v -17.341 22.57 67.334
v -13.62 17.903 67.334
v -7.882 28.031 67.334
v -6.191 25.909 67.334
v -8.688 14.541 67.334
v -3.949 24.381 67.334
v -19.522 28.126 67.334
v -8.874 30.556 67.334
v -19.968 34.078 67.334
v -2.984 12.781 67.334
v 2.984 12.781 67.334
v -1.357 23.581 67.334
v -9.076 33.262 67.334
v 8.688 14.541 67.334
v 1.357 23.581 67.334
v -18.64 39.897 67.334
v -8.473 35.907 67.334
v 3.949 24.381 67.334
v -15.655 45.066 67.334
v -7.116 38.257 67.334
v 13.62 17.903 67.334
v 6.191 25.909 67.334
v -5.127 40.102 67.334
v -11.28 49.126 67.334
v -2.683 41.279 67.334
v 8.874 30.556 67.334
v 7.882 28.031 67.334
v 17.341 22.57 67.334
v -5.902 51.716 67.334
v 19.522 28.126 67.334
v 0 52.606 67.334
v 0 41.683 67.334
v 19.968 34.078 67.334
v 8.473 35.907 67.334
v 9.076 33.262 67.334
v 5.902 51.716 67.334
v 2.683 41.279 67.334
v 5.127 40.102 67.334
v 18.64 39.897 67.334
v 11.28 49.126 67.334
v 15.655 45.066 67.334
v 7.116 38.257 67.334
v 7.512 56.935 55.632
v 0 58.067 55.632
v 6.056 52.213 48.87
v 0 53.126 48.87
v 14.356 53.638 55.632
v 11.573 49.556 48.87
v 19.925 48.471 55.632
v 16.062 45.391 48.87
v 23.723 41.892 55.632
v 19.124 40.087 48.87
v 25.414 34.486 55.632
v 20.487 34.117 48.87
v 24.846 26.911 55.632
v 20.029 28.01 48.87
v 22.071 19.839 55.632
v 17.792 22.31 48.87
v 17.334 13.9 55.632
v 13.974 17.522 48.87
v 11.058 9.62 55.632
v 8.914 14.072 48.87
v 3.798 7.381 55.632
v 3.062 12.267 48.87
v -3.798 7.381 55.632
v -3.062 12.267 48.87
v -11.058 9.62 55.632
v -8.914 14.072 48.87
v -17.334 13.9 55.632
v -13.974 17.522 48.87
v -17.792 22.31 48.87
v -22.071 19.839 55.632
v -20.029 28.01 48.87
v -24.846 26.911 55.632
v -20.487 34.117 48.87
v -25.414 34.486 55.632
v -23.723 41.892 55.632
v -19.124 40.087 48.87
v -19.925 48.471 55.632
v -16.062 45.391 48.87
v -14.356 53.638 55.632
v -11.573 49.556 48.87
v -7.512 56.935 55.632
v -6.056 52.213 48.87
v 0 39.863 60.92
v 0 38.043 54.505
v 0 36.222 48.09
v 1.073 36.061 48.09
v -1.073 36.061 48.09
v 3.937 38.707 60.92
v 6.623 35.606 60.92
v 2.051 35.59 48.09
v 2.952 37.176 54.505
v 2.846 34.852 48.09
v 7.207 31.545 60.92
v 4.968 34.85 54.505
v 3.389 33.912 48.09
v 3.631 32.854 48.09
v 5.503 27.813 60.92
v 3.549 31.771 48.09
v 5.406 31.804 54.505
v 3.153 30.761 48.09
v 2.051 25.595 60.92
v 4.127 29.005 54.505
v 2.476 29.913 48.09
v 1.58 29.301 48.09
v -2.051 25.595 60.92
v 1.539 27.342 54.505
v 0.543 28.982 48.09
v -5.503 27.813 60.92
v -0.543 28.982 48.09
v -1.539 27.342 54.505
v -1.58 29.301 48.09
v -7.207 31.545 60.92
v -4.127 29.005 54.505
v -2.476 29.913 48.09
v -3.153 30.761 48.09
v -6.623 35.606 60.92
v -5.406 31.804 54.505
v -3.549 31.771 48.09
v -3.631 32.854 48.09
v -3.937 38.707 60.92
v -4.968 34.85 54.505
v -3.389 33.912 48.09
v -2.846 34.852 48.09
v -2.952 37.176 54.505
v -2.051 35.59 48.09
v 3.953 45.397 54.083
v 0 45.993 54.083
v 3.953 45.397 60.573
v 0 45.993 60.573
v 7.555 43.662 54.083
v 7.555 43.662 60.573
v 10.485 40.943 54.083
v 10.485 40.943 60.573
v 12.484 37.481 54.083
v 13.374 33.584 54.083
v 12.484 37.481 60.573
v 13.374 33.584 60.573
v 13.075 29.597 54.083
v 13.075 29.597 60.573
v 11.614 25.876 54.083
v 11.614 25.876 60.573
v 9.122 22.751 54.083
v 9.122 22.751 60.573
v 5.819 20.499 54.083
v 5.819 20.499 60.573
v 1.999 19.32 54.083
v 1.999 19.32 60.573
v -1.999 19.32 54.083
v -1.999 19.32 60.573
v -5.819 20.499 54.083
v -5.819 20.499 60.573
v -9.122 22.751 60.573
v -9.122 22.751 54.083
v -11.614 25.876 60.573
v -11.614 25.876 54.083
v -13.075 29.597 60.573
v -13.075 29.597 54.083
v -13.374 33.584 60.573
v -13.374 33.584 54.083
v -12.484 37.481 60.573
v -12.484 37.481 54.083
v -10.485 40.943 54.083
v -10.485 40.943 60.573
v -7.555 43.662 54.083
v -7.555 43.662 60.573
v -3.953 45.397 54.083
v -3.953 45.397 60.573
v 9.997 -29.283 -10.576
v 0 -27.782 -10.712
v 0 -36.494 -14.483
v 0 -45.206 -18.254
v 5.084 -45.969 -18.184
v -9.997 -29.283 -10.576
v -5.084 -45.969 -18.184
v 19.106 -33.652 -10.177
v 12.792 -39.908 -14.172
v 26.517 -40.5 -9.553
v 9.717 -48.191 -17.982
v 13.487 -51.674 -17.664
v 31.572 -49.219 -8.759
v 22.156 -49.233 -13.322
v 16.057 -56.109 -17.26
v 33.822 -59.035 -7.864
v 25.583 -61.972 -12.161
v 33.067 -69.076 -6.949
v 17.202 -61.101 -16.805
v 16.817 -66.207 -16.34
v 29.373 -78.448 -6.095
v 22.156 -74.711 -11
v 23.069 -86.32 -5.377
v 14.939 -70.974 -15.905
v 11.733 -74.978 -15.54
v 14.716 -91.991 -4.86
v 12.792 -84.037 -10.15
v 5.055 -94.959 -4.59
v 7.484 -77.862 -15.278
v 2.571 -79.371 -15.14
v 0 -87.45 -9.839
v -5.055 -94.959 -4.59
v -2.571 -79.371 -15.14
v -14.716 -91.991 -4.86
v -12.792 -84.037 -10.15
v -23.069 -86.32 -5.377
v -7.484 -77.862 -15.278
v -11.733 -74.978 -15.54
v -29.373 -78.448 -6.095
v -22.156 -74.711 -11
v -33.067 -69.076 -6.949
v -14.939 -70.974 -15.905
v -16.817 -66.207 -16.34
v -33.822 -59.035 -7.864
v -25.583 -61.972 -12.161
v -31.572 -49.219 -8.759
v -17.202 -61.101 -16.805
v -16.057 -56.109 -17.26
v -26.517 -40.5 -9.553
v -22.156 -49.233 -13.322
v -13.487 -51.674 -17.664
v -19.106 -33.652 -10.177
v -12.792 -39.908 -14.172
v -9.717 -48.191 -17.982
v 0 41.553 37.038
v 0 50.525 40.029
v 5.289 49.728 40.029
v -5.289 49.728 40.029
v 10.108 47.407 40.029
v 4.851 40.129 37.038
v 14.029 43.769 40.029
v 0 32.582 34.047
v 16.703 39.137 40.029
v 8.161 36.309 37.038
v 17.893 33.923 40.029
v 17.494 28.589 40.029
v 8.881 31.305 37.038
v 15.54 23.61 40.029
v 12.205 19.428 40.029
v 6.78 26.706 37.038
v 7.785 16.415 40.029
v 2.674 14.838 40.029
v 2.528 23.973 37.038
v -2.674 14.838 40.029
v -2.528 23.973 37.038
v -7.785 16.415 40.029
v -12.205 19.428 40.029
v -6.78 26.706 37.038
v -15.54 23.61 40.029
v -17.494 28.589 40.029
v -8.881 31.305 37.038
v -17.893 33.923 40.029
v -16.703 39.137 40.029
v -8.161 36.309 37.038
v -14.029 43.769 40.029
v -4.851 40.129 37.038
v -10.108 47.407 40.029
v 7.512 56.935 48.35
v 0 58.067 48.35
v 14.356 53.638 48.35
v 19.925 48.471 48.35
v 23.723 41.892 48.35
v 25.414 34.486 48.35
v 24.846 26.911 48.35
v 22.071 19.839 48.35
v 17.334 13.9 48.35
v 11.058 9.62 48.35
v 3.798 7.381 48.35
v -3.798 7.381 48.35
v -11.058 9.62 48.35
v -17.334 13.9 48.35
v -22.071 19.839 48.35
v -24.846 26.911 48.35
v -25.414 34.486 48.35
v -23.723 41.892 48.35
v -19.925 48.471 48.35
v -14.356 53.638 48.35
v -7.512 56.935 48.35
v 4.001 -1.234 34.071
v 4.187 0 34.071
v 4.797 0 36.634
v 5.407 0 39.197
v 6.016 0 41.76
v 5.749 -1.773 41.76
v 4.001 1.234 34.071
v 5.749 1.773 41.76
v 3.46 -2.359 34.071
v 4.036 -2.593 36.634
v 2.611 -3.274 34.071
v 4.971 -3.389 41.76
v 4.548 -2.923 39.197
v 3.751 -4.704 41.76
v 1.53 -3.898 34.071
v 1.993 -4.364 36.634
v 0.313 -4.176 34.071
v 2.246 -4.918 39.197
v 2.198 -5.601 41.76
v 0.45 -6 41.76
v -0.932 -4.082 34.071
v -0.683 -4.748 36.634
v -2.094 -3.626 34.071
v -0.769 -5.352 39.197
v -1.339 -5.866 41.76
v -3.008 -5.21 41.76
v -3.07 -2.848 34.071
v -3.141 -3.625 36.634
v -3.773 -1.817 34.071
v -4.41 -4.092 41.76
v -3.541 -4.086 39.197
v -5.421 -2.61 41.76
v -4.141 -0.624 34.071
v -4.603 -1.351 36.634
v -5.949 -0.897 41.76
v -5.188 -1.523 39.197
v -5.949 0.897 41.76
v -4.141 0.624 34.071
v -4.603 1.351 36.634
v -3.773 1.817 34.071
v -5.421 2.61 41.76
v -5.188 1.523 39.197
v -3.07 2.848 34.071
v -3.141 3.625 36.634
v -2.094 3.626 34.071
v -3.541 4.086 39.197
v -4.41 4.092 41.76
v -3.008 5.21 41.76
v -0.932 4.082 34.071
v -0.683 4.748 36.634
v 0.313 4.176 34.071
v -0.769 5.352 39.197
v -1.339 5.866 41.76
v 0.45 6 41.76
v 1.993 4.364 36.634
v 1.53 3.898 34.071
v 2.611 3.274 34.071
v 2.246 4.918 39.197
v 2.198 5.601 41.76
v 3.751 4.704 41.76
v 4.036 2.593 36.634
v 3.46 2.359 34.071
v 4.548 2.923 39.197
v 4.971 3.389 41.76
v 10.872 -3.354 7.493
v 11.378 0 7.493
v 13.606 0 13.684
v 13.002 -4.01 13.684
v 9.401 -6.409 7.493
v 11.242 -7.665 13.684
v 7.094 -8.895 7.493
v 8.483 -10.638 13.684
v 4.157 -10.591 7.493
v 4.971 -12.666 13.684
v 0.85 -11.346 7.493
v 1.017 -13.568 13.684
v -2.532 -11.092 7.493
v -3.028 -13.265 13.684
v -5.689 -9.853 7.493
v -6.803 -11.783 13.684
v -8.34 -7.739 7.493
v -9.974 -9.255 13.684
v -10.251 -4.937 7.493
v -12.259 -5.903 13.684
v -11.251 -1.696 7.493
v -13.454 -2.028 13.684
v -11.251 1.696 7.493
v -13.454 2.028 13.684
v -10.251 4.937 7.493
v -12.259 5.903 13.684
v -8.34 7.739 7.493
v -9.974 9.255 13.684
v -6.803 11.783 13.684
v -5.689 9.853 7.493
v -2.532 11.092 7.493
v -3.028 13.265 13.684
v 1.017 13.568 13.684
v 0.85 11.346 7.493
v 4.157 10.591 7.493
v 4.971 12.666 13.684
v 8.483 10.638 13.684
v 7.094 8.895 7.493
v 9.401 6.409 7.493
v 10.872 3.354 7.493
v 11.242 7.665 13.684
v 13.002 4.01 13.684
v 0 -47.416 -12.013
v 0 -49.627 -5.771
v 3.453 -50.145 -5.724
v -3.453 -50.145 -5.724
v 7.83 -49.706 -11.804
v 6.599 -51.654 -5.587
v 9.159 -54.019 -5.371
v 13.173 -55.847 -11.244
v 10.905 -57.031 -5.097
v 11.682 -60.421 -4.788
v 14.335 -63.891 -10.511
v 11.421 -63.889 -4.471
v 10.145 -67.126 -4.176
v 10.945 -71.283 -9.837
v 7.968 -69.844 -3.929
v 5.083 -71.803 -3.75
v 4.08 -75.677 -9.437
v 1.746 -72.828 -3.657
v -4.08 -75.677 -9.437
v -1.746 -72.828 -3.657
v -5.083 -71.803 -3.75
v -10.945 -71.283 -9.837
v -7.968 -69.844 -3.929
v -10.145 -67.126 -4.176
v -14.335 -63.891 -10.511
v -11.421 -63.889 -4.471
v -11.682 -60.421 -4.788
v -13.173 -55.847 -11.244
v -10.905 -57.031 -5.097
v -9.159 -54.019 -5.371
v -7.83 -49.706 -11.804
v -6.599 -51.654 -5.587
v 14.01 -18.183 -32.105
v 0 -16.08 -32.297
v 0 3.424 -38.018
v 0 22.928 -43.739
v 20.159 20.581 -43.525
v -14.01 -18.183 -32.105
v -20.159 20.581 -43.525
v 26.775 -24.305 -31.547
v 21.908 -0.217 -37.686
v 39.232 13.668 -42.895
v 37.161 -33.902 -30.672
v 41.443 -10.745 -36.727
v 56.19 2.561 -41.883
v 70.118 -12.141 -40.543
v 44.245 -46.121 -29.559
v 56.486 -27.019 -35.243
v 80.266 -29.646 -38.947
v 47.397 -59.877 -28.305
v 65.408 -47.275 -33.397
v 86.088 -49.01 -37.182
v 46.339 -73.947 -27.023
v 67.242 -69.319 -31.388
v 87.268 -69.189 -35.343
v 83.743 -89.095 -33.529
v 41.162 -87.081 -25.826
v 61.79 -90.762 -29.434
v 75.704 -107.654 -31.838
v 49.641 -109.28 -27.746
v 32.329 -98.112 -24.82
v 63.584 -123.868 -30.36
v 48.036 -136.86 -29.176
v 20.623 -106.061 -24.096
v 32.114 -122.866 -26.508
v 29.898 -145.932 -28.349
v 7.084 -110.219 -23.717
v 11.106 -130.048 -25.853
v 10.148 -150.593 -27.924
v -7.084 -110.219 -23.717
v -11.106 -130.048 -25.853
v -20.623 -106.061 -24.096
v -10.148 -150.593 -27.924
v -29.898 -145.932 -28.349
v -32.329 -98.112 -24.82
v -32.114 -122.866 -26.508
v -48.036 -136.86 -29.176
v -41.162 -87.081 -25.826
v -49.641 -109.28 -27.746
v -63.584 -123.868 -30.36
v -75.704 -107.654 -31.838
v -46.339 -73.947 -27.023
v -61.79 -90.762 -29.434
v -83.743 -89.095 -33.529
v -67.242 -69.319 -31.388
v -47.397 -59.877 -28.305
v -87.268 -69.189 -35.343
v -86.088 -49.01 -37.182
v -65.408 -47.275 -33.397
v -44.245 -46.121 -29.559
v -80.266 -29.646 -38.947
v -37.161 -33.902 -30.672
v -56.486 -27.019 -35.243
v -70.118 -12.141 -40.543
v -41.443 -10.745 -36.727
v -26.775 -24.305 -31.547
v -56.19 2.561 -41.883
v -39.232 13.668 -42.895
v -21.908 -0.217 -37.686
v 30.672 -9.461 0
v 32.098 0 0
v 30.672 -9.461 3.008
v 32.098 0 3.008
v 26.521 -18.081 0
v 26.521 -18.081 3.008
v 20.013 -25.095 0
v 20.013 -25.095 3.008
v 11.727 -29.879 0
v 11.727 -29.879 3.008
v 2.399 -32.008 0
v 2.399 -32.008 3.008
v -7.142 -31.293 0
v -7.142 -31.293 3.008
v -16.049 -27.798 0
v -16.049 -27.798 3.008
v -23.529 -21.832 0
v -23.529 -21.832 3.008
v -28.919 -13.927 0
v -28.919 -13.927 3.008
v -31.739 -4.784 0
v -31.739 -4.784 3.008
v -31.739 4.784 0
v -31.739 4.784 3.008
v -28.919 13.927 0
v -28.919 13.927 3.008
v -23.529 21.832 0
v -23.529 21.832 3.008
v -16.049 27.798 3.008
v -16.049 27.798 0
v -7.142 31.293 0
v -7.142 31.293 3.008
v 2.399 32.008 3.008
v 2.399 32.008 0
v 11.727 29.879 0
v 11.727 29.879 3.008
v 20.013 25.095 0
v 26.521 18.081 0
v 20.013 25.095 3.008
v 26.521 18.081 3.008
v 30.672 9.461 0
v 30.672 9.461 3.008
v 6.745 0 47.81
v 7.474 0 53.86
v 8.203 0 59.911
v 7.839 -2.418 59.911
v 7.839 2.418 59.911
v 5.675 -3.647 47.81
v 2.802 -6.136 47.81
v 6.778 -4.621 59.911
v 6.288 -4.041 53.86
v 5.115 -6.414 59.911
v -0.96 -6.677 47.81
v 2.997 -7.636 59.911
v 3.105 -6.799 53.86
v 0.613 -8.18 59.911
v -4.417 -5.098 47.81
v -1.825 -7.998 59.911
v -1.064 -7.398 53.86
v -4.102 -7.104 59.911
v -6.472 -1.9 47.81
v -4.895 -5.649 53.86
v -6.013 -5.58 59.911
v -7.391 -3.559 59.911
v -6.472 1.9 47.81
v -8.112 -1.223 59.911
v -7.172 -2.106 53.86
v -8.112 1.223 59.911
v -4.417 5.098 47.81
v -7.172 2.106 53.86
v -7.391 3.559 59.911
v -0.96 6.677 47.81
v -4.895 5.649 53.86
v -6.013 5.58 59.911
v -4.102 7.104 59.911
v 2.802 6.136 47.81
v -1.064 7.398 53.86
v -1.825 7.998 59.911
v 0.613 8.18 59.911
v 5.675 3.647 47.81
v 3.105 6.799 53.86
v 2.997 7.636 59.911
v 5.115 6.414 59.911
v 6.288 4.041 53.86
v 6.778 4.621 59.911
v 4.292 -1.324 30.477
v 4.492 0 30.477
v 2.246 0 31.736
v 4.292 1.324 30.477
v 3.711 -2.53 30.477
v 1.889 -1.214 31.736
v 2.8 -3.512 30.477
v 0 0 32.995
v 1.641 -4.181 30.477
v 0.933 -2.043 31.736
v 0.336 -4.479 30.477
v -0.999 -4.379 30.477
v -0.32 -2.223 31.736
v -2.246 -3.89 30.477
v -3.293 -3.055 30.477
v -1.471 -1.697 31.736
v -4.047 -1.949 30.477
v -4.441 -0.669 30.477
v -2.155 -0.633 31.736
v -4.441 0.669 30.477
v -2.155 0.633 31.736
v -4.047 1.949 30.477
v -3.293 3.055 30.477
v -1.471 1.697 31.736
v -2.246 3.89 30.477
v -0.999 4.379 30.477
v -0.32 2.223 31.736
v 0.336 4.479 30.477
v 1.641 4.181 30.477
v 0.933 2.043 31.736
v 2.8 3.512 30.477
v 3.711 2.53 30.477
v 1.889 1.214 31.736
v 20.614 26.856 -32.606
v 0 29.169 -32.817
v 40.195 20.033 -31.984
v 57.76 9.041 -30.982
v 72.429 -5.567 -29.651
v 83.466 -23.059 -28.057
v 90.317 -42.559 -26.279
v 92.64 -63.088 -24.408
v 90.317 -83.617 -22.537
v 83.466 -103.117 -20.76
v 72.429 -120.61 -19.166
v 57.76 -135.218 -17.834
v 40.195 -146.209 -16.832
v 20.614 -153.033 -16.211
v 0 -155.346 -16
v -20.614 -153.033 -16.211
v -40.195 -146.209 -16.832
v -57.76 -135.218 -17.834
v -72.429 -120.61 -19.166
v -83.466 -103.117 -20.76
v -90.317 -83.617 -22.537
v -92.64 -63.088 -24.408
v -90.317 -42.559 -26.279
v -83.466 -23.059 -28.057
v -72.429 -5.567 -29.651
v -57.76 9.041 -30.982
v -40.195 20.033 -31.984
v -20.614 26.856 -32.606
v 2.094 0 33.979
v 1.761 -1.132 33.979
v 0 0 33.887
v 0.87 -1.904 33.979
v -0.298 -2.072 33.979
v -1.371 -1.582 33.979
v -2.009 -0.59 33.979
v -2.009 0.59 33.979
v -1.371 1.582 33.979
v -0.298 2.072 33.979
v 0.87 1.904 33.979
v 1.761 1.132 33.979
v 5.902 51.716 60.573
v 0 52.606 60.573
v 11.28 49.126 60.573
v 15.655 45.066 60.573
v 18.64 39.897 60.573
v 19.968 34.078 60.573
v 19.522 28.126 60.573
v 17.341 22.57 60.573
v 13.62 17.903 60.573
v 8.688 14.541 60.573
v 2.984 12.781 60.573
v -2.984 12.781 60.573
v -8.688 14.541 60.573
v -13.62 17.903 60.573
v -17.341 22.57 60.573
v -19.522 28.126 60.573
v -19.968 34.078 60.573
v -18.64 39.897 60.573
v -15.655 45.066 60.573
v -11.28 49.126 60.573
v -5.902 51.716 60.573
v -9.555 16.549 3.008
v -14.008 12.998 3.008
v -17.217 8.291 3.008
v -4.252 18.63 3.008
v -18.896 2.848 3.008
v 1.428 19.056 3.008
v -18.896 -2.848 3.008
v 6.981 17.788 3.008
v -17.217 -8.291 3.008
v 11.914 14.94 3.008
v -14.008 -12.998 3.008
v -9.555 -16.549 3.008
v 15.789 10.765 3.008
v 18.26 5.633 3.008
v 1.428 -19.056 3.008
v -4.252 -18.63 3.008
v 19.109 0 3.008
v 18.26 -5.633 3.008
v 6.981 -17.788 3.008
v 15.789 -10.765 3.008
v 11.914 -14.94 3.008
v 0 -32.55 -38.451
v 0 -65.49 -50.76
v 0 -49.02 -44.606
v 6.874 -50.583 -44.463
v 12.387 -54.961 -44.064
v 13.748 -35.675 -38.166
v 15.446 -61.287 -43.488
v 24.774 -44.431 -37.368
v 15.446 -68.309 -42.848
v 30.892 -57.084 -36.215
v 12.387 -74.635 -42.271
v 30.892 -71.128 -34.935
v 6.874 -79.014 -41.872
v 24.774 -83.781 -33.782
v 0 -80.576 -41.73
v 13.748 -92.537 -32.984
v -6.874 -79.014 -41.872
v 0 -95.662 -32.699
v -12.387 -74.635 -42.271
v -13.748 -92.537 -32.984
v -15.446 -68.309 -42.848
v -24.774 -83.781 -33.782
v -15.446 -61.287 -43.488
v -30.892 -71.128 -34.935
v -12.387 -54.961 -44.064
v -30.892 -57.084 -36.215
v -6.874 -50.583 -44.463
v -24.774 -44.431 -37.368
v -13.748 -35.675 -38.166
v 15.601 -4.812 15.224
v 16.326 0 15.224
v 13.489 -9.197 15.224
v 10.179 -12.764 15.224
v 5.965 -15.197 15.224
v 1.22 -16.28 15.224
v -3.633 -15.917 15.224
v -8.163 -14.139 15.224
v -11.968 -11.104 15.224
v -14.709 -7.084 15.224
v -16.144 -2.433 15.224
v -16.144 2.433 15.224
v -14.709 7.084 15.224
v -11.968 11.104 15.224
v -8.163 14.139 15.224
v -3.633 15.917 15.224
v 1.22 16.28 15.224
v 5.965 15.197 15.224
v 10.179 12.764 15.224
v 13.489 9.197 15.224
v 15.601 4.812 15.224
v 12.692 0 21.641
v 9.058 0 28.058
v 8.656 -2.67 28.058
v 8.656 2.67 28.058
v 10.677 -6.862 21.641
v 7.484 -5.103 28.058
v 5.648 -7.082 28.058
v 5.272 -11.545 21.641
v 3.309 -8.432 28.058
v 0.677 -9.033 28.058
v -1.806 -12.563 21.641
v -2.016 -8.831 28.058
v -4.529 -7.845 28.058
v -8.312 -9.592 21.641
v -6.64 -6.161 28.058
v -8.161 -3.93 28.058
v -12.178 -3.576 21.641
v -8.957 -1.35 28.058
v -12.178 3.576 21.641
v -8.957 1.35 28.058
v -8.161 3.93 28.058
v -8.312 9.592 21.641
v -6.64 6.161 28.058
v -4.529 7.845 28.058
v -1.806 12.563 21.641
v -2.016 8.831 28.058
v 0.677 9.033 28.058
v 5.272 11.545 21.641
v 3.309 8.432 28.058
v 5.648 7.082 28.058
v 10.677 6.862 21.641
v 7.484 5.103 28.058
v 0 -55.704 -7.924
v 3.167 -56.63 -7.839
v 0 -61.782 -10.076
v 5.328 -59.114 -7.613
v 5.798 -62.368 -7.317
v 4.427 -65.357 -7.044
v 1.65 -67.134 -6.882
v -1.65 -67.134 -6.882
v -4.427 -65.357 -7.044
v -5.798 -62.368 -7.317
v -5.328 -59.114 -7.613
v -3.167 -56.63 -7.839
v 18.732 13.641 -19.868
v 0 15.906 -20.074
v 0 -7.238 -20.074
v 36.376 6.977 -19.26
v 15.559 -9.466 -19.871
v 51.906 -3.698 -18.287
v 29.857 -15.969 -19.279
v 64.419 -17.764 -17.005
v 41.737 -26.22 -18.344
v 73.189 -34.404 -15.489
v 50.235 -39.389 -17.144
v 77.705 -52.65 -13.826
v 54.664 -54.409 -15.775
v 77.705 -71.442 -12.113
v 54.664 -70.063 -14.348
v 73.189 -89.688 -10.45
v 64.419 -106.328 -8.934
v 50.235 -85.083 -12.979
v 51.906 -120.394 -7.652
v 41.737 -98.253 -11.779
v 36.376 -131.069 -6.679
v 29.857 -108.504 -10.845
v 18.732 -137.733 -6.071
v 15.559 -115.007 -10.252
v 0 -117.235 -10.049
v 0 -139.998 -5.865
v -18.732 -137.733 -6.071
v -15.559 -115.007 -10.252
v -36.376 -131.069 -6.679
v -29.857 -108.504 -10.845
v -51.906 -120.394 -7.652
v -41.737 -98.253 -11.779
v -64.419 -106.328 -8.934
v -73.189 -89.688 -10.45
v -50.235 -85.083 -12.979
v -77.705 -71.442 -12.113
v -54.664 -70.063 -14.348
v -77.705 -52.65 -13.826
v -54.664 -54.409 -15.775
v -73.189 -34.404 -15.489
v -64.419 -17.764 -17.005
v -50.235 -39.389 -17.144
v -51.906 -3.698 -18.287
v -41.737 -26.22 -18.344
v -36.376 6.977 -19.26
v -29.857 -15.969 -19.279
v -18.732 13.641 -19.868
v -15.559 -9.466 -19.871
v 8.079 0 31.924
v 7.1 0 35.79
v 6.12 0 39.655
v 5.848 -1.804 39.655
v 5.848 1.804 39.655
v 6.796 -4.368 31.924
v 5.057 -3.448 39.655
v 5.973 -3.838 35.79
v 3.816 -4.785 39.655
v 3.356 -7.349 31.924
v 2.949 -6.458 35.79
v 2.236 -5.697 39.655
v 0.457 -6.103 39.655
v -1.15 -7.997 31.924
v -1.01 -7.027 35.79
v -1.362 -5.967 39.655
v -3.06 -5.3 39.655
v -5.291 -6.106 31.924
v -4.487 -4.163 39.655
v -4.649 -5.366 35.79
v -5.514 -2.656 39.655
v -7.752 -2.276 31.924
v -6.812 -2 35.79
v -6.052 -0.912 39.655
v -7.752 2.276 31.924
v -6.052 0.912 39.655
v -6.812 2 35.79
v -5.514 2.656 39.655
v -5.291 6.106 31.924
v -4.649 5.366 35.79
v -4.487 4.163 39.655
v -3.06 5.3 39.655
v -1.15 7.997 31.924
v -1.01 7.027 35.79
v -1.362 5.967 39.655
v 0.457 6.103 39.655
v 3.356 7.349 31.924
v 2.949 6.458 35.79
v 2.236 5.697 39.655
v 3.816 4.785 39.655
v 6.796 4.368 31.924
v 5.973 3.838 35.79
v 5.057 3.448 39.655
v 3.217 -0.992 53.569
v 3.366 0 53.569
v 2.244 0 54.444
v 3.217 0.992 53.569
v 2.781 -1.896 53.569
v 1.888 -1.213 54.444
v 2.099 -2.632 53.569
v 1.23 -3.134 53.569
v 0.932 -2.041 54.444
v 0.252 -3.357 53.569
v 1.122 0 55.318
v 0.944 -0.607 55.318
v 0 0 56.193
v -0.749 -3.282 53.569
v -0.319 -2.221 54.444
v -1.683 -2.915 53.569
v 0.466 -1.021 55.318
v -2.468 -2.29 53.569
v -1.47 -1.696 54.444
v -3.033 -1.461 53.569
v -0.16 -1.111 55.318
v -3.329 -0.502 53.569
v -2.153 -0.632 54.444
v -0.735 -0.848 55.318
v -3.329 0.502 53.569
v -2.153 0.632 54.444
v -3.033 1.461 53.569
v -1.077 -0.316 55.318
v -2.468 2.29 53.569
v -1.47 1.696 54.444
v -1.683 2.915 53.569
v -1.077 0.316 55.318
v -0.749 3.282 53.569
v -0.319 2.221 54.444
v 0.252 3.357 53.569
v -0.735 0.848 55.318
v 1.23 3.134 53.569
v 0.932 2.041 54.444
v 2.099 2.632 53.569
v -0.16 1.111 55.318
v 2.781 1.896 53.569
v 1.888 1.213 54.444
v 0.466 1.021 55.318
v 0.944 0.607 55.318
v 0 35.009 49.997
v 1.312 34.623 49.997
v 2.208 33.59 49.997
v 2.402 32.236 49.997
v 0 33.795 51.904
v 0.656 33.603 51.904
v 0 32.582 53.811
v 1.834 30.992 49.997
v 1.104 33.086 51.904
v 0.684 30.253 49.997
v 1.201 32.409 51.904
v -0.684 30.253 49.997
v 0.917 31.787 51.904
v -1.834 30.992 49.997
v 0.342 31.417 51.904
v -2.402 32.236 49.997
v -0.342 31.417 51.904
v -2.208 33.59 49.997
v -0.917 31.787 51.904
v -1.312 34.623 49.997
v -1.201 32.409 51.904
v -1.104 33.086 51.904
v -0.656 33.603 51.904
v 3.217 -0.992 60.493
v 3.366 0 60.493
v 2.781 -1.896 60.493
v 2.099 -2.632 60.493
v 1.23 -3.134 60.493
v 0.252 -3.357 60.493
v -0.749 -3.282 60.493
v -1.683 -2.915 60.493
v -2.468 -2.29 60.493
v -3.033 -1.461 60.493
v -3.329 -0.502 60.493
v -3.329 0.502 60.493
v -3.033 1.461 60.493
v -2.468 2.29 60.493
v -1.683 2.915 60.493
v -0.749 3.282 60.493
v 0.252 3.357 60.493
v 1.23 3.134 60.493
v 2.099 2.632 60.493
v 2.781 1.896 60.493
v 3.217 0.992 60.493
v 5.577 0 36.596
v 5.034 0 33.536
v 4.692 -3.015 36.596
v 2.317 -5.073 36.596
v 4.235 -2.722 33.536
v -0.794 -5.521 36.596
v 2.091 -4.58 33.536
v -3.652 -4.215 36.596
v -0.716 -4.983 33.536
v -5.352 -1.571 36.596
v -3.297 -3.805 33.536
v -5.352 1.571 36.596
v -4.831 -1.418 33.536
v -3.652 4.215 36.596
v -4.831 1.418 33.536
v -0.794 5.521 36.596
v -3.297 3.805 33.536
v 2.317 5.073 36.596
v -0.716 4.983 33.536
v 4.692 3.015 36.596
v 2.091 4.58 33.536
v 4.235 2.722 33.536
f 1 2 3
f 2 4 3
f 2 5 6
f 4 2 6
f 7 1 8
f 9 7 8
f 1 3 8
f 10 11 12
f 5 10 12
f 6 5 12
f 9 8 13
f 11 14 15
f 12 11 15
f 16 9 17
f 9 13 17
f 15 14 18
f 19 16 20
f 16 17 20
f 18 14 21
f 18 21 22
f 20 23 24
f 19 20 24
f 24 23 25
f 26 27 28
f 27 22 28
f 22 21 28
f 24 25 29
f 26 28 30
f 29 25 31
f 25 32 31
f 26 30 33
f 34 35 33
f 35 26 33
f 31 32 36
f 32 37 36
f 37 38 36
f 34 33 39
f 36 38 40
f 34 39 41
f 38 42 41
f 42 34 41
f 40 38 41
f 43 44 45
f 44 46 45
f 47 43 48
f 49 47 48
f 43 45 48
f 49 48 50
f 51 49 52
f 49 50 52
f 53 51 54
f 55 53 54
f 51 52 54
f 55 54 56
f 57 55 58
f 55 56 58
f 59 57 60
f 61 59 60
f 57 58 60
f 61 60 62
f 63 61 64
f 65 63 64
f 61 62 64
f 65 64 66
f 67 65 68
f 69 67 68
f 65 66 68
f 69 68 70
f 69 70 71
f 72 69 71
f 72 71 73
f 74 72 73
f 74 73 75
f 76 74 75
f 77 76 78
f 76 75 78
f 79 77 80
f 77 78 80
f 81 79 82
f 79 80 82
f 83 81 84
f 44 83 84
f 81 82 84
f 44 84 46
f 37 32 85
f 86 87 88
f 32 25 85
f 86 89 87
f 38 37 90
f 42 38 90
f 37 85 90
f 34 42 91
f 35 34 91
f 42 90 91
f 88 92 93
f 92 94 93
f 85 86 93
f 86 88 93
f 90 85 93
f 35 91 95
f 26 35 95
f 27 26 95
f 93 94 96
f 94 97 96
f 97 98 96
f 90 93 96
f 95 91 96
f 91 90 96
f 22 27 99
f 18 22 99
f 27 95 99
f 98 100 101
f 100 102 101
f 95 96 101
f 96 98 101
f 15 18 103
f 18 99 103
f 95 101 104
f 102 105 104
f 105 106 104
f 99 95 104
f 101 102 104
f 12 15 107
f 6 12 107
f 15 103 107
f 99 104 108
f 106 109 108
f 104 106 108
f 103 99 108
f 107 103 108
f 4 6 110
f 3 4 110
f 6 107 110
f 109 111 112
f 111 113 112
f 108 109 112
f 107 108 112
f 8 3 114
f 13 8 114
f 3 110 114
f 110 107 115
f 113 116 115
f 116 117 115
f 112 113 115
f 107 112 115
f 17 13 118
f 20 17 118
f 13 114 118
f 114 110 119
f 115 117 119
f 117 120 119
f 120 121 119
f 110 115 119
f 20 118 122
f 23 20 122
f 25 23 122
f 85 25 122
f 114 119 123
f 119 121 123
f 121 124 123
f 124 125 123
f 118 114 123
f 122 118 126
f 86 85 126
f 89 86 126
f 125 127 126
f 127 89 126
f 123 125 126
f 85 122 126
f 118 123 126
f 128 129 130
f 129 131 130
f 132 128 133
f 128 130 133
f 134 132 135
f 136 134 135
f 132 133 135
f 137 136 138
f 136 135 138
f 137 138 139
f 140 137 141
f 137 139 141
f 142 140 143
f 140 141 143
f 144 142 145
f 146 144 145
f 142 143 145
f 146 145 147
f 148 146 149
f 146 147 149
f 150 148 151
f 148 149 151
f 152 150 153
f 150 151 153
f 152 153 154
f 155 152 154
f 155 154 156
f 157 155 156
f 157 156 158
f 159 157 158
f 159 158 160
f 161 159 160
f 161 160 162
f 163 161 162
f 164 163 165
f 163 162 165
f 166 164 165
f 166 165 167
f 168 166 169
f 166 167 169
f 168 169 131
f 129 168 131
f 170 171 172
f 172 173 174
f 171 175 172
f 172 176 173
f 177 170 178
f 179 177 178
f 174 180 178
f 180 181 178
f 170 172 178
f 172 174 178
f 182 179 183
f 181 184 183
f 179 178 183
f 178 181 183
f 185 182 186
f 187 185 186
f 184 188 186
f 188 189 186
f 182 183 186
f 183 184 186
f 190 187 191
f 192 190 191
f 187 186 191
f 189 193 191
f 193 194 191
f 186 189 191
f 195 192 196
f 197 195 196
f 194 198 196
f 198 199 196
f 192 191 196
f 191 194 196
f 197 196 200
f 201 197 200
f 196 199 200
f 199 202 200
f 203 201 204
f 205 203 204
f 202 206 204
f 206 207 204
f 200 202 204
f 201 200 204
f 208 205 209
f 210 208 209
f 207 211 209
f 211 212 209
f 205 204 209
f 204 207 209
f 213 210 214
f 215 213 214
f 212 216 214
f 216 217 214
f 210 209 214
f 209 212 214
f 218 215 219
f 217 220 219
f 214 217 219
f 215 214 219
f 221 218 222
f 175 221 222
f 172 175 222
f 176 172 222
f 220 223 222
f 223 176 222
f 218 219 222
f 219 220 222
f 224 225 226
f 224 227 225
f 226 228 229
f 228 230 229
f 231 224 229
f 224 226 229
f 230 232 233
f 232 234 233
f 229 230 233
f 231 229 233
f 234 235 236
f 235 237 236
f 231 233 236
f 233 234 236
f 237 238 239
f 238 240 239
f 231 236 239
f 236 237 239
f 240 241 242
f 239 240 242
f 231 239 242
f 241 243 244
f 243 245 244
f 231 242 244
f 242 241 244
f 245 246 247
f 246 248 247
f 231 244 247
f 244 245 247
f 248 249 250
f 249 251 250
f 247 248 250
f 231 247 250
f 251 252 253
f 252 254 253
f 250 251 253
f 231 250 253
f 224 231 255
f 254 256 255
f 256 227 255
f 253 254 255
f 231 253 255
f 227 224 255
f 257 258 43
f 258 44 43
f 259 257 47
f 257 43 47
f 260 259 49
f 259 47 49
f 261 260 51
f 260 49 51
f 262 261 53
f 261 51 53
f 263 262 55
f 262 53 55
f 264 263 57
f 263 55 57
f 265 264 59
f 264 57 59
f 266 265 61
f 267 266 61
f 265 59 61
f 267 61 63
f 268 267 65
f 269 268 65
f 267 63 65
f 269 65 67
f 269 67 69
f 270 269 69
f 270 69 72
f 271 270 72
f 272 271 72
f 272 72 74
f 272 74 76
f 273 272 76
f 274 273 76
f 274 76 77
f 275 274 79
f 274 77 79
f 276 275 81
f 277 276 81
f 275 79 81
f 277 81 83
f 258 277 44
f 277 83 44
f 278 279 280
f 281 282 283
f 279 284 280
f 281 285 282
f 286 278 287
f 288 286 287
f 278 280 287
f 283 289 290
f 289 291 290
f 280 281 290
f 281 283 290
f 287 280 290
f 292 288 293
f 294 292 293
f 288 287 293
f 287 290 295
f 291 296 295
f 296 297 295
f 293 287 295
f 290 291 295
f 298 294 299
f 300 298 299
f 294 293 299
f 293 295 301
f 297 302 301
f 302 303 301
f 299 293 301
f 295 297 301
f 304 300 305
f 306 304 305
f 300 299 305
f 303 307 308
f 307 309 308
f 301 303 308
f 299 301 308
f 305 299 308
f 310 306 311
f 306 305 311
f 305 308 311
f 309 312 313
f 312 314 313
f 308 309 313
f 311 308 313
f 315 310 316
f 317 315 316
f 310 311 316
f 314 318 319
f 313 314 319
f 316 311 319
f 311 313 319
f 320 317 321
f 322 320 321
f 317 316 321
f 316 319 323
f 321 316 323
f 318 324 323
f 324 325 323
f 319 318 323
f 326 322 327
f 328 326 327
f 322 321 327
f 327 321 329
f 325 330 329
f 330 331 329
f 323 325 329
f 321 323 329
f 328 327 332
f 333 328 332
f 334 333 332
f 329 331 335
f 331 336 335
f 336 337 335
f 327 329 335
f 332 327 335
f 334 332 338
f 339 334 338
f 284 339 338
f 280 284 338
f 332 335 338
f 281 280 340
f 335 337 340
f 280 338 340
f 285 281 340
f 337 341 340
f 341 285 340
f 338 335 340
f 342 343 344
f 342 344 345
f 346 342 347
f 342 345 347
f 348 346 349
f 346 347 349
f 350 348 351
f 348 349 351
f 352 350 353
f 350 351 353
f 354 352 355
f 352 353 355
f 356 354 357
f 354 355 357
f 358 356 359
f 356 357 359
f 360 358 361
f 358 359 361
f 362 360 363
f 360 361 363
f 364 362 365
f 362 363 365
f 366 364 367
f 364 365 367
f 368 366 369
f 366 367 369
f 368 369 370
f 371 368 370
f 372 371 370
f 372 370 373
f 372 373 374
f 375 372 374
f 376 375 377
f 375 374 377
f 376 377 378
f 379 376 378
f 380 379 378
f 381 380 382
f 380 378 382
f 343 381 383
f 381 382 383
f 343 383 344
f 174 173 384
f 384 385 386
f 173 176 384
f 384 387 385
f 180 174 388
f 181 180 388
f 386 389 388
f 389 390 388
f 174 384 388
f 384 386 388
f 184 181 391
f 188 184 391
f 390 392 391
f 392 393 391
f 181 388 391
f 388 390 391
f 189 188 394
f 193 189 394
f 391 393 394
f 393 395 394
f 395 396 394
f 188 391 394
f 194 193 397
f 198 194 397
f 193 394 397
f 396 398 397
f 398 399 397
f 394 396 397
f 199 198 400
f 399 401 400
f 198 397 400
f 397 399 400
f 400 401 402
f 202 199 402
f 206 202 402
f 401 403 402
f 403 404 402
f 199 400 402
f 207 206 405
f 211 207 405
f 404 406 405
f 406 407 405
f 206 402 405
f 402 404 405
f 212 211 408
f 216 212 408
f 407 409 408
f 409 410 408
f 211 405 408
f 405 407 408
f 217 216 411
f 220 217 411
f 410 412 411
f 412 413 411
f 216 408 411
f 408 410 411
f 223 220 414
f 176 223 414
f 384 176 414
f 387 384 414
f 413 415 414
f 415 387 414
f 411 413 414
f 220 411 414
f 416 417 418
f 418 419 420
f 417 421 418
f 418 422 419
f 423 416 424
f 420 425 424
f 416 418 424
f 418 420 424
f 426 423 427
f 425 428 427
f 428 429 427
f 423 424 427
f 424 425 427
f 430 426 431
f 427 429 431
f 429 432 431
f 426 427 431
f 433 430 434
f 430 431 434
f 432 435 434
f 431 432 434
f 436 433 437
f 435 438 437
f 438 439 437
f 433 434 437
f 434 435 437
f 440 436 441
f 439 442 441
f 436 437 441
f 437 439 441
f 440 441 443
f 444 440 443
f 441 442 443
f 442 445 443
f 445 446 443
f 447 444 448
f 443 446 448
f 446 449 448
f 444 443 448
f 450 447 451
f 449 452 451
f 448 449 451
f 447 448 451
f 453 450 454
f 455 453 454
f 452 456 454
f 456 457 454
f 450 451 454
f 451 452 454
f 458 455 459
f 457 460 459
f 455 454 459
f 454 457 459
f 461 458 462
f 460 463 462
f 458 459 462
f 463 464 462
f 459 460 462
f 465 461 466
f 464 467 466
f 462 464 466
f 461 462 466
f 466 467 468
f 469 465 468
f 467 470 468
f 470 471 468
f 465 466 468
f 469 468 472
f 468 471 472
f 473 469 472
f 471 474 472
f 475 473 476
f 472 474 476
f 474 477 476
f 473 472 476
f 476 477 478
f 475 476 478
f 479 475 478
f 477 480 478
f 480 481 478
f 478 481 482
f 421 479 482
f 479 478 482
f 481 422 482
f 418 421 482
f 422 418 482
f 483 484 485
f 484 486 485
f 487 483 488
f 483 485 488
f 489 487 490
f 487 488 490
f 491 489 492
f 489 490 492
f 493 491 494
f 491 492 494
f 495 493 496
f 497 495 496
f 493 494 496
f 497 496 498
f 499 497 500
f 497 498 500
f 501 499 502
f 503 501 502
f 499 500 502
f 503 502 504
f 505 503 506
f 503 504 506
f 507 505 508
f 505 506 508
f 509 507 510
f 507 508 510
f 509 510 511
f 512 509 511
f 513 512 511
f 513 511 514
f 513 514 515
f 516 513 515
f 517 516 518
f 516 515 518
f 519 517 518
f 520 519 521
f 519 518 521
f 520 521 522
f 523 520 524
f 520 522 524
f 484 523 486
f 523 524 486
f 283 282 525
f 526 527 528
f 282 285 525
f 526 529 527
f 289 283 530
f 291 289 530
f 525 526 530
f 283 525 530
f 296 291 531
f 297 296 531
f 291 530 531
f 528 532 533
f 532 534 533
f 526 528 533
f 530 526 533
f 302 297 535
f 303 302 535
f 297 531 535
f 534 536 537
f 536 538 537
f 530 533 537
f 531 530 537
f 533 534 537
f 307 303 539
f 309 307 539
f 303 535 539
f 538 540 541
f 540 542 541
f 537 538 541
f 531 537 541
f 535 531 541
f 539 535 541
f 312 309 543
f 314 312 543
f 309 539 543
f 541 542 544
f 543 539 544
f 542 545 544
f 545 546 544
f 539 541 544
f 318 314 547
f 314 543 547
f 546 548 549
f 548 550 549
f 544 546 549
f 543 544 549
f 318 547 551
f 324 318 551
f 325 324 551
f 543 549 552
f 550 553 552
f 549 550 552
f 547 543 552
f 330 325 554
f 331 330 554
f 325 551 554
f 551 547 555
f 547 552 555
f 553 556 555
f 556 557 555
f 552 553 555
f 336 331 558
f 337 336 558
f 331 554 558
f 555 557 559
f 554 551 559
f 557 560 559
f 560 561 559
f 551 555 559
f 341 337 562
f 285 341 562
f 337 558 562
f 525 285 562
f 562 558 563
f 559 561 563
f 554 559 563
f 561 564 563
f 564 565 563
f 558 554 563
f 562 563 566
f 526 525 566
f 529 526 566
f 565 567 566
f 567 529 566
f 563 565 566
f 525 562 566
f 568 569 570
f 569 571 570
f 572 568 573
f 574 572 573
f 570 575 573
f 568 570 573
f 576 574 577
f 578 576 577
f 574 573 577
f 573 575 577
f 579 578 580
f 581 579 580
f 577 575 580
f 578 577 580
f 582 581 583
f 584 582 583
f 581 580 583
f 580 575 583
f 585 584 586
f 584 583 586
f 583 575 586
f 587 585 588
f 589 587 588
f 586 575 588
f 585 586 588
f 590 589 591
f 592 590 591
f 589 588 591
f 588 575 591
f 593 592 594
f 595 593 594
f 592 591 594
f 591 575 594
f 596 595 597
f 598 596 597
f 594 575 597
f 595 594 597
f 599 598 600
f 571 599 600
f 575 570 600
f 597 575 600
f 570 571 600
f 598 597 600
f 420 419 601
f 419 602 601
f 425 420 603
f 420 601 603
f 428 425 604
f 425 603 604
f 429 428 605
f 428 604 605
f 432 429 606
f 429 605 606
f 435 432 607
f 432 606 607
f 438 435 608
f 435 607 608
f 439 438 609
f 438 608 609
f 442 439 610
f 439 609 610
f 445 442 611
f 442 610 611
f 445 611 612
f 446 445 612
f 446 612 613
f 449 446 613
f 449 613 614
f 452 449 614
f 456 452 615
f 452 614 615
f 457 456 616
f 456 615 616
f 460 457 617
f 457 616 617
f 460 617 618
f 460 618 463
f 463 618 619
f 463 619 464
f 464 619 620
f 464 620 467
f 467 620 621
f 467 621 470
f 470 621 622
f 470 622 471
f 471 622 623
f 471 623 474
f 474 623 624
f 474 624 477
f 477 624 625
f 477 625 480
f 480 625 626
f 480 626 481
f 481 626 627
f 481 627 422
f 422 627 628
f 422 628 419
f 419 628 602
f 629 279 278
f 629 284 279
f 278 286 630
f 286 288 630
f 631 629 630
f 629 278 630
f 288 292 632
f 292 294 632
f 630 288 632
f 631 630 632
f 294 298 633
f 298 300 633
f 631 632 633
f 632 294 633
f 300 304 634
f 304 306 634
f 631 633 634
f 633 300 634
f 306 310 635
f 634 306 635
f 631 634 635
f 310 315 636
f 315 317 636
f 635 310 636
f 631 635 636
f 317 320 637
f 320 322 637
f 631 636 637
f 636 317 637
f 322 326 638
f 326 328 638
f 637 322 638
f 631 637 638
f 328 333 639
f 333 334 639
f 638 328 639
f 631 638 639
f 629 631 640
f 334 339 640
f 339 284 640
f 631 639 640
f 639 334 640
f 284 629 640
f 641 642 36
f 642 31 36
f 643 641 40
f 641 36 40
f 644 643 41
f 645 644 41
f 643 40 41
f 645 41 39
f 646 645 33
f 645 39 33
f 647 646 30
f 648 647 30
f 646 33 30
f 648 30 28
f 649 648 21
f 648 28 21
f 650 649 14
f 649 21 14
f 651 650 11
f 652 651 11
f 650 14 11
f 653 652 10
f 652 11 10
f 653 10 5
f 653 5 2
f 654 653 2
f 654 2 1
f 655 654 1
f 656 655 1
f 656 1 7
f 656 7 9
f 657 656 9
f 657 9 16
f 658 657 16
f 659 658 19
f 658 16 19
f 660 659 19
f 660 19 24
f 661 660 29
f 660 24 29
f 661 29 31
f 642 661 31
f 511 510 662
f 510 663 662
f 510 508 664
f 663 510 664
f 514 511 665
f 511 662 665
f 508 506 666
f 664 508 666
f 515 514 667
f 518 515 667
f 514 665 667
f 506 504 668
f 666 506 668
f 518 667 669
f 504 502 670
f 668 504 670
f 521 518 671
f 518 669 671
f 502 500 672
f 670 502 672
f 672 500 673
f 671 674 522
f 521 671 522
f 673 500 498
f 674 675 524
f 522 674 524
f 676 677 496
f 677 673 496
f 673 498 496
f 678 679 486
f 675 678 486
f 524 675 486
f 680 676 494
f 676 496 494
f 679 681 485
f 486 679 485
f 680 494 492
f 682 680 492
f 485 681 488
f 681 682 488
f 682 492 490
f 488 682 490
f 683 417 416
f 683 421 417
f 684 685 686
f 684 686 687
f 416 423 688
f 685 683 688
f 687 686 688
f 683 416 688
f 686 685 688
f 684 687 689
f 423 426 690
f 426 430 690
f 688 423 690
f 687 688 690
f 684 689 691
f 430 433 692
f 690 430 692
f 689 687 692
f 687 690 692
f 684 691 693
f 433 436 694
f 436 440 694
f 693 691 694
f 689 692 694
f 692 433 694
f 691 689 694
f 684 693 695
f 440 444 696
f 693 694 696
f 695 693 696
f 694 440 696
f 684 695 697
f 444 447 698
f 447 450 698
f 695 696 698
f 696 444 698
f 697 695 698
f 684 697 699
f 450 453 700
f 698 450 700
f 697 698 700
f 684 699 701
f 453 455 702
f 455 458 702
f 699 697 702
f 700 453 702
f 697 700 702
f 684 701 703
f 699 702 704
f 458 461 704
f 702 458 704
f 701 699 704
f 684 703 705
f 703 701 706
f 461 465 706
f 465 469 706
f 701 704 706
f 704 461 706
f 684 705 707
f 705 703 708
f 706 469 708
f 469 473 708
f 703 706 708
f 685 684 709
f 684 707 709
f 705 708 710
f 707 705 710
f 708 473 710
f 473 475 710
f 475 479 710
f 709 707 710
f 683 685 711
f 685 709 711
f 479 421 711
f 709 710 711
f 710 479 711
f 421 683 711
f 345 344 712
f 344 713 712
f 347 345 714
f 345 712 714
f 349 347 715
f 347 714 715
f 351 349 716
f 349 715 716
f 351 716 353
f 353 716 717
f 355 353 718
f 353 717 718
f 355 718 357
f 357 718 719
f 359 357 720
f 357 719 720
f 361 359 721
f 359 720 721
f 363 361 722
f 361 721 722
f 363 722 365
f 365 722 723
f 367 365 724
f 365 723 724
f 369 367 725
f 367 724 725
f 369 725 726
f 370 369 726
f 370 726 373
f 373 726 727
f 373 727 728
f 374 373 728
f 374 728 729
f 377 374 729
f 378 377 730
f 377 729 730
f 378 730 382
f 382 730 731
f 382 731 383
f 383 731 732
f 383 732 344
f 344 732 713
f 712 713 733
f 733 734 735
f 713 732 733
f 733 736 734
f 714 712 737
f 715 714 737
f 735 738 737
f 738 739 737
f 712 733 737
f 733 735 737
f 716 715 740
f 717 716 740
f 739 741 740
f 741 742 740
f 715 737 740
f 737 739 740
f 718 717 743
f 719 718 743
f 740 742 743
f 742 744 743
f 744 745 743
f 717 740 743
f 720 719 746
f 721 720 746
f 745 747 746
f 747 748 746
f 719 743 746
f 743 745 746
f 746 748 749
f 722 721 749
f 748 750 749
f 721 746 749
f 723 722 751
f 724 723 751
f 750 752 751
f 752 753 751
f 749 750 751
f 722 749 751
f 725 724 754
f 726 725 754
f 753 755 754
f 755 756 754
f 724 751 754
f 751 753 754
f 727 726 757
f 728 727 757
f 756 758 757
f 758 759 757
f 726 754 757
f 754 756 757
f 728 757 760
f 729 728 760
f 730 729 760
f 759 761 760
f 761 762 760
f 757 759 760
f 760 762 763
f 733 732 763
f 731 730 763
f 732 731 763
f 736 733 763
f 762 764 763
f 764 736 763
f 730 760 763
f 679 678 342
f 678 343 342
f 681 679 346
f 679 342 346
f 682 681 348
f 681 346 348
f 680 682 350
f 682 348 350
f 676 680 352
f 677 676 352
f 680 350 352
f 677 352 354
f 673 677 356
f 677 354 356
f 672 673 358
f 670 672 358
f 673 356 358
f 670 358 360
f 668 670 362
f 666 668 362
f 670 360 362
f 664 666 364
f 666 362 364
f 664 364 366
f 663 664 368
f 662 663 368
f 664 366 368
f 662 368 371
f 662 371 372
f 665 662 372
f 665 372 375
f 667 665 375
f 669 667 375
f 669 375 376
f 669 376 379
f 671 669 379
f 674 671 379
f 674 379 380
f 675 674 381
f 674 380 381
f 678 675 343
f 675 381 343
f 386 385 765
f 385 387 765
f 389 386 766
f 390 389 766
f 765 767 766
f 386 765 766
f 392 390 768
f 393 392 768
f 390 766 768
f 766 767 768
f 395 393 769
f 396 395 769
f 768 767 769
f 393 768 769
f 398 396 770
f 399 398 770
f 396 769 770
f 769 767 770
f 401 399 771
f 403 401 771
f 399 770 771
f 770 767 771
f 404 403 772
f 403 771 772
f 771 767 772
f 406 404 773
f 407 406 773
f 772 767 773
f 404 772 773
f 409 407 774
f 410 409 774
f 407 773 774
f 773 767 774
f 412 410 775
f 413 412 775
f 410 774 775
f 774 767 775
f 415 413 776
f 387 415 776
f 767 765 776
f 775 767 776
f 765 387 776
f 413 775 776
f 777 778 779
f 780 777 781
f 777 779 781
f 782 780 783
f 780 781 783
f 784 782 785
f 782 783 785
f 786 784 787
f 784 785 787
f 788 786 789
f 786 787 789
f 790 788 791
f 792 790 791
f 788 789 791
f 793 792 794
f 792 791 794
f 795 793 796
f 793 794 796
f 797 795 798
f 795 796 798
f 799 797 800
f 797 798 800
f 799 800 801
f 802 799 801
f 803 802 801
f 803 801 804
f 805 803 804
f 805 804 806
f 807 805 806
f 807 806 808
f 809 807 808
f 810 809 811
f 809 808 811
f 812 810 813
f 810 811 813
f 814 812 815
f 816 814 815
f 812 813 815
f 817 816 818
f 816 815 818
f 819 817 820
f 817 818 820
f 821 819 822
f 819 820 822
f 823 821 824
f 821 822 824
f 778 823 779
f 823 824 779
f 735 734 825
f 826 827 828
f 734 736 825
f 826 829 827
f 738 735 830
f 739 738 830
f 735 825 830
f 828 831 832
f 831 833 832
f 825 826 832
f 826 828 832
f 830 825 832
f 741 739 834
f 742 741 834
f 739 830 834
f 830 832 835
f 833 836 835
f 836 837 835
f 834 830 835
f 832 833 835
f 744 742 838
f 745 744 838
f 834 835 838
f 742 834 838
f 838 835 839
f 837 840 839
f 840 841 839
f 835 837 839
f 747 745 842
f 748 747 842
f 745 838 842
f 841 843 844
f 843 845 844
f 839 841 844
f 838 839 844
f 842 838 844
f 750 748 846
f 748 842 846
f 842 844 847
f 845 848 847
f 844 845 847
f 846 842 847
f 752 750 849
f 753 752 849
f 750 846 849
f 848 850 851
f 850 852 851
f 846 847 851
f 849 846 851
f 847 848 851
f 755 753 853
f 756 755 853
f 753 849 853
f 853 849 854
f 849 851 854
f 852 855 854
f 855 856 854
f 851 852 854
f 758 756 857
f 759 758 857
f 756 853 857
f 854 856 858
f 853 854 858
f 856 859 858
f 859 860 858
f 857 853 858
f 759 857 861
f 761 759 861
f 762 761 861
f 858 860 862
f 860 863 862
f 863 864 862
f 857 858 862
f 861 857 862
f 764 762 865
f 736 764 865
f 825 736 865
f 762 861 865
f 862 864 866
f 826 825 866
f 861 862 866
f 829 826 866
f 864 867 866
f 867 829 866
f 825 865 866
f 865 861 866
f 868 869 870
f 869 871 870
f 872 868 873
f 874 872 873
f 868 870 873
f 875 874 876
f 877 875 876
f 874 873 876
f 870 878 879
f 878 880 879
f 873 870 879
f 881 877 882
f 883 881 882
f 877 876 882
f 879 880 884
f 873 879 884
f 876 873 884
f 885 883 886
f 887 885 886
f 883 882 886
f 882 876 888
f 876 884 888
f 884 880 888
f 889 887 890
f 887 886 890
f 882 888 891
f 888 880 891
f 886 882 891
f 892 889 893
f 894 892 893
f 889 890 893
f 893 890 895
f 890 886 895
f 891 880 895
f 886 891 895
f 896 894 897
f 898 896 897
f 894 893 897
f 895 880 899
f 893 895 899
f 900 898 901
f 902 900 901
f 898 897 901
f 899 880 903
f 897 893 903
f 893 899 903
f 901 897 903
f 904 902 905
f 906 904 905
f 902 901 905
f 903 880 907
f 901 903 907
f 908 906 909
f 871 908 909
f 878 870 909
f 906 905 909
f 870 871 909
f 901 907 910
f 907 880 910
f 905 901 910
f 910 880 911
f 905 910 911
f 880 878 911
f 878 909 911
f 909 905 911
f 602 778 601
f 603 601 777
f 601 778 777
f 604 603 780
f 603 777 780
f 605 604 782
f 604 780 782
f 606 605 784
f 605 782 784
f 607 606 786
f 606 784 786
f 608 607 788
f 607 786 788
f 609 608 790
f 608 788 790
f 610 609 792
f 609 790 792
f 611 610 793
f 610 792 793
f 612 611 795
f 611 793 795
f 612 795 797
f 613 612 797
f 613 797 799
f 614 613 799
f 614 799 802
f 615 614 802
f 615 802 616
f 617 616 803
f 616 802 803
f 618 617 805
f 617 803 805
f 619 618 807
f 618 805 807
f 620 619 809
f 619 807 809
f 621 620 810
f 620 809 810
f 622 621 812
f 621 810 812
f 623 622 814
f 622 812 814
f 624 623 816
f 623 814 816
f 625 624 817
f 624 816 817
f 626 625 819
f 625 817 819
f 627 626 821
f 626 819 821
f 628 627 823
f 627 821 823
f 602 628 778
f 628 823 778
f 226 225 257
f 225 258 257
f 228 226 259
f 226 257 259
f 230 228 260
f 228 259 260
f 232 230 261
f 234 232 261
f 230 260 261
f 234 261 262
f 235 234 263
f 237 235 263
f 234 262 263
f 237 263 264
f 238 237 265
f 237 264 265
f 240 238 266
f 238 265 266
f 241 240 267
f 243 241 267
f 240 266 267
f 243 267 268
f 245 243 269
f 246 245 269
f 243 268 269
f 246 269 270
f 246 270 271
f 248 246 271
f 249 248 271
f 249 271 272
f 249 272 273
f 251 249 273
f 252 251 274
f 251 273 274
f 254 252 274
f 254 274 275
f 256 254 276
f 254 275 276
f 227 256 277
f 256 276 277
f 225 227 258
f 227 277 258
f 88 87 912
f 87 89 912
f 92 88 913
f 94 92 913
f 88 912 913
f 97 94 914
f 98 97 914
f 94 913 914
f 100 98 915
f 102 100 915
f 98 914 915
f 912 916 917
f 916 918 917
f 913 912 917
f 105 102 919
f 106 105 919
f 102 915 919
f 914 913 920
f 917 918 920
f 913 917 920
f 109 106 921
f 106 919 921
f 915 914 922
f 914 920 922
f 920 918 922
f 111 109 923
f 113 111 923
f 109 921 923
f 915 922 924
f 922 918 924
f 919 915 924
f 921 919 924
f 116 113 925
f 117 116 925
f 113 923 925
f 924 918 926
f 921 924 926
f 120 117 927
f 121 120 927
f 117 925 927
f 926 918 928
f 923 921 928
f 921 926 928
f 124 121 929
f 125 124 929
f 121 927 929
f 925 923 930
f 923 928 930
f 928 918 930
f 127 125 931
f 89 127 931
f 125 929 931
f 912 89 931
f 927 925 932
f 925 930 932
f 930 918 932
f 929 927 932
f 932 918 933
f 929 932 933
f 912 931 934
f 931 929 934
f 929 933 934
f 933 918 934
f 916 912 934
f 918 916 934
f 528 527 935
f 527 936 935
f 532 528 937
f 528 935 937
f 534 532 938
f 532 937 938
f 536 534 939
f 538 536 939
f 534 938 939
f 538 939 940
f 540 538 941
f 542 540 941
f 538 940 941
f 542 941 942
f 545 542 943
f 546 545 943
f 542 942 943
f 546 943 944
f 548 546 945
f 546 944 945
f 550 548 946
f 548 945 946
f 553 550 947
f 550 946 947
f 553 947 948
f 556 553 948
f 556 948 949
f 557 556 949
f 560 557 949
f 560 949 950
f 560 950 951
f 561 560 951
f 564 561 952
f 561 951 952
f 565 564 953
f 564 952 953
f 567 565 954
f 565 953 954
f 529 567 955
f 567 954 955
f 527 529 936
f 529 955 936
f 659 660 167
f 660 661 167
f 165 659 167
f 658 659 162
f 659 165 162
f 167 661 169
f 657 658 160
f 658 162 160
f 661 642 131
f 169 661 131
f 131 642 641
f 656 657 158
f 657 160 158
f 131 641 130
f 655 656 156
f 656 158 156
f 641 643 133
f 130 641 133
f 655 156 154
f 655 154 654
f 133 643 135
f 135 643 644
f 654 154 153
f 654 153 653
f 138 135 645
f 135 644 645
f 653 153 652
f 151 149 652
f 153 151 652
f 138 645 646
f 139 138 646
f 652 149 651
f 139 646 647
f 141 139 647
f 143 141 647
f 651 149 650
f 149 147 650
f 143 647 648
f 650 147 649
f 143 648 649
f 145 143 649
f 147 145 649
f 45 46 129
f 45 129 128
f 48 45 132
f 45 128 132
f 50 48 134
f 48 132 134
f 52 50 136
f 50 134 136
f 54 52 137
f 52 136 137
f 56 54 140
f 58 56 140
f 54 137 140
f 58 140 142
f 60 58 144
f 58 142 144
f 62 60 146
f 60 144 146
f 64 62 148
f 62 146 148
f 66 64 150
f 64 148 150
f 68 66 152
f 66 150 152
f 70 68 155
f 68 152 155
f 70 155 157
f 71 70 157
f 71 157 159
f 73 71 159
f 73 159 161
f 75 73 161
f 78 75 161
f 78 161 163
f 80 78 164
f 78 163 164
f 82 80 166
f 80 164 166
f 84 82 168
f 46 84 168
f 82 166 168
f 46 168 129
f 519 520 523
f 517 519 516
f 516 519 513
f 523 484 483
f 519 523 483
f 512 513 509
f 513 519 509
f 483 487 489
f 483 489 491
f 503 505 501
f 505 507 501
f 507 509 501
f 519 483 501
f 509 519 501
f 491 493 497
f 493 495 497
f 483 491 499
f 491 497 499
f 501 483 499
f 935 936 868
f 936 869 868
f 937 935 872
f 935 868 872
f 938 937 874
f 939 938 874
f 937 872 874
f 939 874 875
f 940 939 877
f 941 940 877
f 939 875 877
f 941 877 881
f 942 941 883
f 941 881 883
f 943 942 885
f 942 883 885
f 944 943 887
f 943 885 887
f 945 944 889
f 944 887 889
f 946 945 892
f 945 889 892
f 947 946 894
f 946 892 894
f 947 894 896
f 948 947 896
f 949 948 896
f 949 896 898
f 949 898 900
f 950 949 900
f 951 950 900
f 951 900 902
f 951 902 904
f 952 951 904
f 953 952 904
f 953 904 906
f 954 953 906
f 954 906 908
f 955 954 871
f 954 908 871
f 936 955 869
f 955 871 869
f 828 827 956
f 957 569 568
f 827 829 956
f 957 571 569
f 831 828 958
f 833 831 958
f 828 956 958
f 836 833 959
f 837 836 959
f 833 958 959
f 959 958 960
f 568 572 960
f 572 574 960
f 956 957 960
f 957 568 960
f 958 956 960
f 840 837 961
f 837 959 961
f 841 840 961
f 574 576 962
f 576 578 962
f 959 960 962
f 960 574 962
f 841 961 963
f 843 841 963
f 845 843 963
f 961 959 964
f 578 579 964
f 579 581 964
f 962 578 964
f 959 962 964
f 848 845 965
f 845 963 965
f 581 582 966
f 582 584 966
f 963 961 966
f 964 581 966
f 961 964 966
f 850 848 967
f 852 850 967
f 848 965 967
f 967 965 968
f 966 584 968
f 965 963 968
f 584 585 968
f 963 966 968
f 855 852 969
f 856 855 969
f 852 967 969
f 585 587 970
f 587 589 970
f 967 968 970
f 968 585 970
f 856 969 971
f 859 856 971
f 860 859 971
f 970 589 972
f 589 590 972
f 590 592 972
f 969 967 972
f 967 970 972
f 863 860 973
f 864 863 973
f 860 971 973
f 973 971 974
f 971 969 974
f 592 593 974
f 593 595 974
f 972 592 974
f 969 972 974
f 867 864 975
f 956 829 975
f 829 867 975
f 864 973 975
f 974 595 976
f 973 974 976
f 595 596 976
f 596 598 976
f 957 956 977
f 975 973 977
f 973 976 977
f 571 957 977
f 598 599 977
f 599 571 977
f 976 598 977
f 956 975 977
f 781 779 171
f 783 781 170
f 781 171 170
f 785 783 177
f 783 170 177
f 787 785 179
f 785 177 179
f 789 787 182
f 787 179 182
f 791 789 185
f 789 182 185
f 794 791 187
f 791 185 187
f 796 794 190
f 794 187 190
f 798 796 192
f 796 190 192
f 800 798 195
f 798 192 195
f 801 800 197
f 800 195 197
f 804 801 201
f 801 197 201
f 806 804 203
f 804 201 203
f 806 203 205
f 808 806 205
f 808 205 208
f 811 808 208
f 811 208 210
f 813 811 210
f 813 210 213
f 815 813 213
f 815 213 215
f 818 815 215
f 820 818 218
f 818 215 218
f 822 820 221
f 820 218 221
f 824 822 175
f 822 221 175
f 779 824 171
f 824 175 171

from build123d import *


with BuildPart() as f1:
    # F0 (on Front) → F1 (revolve)
    with BuildSketch(Plane.XZ):
        Polygon((9.0583171695, 28.0581843108), (6.1203795485, 39.6553091705), (4.4915522449, 30.4768476635), (0, 32.9945832491), (0, 0), (32.0979319513, 0), (32.0979319513, 3.0083998572), (19.1091578454, 3.0083998572), (11.3777415827, 7.4926204979), (13.6061028525, 13.6839394666), (16.3258463144, 15.224034898), align=None)
    revolve(axis=Axis((0, 0, 16.4972916245), (0, 0, -1)))


with BuildPart() as f3:
    # F2 (on Front) → F3 (revolve)
    with BuildSketch(Plane.XZ):
        Polygon((3.3663465721, 53.5688661039), (0, 56.192997843), (0, 33.8872000575), (4.1873282753, 34.0710841119), (6.0164295137, 41.7602844536), (8.2032037899, 59.9105134606), (3.3663465721, 60.4932672616), align=None)
    revolve(axis=Axis((0, 0, 45.0400989503), (0, 0, -1)))


with BuildPart() as f5:
    # F4 (on Right) → F5 (revolve)
    with BuildSketch(Plane.YZ):
        Polygon((36.2223647535, 48.0902604759), (32.5816236436, 53.8114197552), (32.5816236436, 34.0474098921), (50.5252666771, 40.0286242366), (58.0667965114, 48.3503118157), (58.0667965114, 55.6317903101), (53.1257949769, 48.8704182208), (45.9927759263, 54.0830078562), (45.9927759263, 60.5727918446), (52.6056885719, 60.5727918446), (52.6056885719, 67.3341602087), (41.683472693, 67.3341602087), align=None)
    revolve(axis=Axis((0, 32.5816236436, 43.9294148237), (0, 0, -1)))


with BuildPart() as f7:
    # F6 (on Right) → F7 (revolve)
    with BuildSketch(Plane.YZ):
        Polygon((-27.7824141085, -10.7123497874), (-45.2059470117, -18.2538814843), (-49.6268458664, -5.7713496499), (-61.7820319216, -10.0763134844), (-65.4900670052, -50.760474056), (-16.080038622, -32.2967320681), (22.9278746992, -43.739054352), (29.1691422462, -32.8168384731), (15.9064494073, -20.0742501765), (-7.2382469662, -20.0742501765), align=None)
    revolve(axis=Axis((0, -63.6360494634, -30.4183937702), (0, -0.0907657736, -0.9958722681)))


solid = Compound([f1.part, f3.part, f5.part, f7.part])
